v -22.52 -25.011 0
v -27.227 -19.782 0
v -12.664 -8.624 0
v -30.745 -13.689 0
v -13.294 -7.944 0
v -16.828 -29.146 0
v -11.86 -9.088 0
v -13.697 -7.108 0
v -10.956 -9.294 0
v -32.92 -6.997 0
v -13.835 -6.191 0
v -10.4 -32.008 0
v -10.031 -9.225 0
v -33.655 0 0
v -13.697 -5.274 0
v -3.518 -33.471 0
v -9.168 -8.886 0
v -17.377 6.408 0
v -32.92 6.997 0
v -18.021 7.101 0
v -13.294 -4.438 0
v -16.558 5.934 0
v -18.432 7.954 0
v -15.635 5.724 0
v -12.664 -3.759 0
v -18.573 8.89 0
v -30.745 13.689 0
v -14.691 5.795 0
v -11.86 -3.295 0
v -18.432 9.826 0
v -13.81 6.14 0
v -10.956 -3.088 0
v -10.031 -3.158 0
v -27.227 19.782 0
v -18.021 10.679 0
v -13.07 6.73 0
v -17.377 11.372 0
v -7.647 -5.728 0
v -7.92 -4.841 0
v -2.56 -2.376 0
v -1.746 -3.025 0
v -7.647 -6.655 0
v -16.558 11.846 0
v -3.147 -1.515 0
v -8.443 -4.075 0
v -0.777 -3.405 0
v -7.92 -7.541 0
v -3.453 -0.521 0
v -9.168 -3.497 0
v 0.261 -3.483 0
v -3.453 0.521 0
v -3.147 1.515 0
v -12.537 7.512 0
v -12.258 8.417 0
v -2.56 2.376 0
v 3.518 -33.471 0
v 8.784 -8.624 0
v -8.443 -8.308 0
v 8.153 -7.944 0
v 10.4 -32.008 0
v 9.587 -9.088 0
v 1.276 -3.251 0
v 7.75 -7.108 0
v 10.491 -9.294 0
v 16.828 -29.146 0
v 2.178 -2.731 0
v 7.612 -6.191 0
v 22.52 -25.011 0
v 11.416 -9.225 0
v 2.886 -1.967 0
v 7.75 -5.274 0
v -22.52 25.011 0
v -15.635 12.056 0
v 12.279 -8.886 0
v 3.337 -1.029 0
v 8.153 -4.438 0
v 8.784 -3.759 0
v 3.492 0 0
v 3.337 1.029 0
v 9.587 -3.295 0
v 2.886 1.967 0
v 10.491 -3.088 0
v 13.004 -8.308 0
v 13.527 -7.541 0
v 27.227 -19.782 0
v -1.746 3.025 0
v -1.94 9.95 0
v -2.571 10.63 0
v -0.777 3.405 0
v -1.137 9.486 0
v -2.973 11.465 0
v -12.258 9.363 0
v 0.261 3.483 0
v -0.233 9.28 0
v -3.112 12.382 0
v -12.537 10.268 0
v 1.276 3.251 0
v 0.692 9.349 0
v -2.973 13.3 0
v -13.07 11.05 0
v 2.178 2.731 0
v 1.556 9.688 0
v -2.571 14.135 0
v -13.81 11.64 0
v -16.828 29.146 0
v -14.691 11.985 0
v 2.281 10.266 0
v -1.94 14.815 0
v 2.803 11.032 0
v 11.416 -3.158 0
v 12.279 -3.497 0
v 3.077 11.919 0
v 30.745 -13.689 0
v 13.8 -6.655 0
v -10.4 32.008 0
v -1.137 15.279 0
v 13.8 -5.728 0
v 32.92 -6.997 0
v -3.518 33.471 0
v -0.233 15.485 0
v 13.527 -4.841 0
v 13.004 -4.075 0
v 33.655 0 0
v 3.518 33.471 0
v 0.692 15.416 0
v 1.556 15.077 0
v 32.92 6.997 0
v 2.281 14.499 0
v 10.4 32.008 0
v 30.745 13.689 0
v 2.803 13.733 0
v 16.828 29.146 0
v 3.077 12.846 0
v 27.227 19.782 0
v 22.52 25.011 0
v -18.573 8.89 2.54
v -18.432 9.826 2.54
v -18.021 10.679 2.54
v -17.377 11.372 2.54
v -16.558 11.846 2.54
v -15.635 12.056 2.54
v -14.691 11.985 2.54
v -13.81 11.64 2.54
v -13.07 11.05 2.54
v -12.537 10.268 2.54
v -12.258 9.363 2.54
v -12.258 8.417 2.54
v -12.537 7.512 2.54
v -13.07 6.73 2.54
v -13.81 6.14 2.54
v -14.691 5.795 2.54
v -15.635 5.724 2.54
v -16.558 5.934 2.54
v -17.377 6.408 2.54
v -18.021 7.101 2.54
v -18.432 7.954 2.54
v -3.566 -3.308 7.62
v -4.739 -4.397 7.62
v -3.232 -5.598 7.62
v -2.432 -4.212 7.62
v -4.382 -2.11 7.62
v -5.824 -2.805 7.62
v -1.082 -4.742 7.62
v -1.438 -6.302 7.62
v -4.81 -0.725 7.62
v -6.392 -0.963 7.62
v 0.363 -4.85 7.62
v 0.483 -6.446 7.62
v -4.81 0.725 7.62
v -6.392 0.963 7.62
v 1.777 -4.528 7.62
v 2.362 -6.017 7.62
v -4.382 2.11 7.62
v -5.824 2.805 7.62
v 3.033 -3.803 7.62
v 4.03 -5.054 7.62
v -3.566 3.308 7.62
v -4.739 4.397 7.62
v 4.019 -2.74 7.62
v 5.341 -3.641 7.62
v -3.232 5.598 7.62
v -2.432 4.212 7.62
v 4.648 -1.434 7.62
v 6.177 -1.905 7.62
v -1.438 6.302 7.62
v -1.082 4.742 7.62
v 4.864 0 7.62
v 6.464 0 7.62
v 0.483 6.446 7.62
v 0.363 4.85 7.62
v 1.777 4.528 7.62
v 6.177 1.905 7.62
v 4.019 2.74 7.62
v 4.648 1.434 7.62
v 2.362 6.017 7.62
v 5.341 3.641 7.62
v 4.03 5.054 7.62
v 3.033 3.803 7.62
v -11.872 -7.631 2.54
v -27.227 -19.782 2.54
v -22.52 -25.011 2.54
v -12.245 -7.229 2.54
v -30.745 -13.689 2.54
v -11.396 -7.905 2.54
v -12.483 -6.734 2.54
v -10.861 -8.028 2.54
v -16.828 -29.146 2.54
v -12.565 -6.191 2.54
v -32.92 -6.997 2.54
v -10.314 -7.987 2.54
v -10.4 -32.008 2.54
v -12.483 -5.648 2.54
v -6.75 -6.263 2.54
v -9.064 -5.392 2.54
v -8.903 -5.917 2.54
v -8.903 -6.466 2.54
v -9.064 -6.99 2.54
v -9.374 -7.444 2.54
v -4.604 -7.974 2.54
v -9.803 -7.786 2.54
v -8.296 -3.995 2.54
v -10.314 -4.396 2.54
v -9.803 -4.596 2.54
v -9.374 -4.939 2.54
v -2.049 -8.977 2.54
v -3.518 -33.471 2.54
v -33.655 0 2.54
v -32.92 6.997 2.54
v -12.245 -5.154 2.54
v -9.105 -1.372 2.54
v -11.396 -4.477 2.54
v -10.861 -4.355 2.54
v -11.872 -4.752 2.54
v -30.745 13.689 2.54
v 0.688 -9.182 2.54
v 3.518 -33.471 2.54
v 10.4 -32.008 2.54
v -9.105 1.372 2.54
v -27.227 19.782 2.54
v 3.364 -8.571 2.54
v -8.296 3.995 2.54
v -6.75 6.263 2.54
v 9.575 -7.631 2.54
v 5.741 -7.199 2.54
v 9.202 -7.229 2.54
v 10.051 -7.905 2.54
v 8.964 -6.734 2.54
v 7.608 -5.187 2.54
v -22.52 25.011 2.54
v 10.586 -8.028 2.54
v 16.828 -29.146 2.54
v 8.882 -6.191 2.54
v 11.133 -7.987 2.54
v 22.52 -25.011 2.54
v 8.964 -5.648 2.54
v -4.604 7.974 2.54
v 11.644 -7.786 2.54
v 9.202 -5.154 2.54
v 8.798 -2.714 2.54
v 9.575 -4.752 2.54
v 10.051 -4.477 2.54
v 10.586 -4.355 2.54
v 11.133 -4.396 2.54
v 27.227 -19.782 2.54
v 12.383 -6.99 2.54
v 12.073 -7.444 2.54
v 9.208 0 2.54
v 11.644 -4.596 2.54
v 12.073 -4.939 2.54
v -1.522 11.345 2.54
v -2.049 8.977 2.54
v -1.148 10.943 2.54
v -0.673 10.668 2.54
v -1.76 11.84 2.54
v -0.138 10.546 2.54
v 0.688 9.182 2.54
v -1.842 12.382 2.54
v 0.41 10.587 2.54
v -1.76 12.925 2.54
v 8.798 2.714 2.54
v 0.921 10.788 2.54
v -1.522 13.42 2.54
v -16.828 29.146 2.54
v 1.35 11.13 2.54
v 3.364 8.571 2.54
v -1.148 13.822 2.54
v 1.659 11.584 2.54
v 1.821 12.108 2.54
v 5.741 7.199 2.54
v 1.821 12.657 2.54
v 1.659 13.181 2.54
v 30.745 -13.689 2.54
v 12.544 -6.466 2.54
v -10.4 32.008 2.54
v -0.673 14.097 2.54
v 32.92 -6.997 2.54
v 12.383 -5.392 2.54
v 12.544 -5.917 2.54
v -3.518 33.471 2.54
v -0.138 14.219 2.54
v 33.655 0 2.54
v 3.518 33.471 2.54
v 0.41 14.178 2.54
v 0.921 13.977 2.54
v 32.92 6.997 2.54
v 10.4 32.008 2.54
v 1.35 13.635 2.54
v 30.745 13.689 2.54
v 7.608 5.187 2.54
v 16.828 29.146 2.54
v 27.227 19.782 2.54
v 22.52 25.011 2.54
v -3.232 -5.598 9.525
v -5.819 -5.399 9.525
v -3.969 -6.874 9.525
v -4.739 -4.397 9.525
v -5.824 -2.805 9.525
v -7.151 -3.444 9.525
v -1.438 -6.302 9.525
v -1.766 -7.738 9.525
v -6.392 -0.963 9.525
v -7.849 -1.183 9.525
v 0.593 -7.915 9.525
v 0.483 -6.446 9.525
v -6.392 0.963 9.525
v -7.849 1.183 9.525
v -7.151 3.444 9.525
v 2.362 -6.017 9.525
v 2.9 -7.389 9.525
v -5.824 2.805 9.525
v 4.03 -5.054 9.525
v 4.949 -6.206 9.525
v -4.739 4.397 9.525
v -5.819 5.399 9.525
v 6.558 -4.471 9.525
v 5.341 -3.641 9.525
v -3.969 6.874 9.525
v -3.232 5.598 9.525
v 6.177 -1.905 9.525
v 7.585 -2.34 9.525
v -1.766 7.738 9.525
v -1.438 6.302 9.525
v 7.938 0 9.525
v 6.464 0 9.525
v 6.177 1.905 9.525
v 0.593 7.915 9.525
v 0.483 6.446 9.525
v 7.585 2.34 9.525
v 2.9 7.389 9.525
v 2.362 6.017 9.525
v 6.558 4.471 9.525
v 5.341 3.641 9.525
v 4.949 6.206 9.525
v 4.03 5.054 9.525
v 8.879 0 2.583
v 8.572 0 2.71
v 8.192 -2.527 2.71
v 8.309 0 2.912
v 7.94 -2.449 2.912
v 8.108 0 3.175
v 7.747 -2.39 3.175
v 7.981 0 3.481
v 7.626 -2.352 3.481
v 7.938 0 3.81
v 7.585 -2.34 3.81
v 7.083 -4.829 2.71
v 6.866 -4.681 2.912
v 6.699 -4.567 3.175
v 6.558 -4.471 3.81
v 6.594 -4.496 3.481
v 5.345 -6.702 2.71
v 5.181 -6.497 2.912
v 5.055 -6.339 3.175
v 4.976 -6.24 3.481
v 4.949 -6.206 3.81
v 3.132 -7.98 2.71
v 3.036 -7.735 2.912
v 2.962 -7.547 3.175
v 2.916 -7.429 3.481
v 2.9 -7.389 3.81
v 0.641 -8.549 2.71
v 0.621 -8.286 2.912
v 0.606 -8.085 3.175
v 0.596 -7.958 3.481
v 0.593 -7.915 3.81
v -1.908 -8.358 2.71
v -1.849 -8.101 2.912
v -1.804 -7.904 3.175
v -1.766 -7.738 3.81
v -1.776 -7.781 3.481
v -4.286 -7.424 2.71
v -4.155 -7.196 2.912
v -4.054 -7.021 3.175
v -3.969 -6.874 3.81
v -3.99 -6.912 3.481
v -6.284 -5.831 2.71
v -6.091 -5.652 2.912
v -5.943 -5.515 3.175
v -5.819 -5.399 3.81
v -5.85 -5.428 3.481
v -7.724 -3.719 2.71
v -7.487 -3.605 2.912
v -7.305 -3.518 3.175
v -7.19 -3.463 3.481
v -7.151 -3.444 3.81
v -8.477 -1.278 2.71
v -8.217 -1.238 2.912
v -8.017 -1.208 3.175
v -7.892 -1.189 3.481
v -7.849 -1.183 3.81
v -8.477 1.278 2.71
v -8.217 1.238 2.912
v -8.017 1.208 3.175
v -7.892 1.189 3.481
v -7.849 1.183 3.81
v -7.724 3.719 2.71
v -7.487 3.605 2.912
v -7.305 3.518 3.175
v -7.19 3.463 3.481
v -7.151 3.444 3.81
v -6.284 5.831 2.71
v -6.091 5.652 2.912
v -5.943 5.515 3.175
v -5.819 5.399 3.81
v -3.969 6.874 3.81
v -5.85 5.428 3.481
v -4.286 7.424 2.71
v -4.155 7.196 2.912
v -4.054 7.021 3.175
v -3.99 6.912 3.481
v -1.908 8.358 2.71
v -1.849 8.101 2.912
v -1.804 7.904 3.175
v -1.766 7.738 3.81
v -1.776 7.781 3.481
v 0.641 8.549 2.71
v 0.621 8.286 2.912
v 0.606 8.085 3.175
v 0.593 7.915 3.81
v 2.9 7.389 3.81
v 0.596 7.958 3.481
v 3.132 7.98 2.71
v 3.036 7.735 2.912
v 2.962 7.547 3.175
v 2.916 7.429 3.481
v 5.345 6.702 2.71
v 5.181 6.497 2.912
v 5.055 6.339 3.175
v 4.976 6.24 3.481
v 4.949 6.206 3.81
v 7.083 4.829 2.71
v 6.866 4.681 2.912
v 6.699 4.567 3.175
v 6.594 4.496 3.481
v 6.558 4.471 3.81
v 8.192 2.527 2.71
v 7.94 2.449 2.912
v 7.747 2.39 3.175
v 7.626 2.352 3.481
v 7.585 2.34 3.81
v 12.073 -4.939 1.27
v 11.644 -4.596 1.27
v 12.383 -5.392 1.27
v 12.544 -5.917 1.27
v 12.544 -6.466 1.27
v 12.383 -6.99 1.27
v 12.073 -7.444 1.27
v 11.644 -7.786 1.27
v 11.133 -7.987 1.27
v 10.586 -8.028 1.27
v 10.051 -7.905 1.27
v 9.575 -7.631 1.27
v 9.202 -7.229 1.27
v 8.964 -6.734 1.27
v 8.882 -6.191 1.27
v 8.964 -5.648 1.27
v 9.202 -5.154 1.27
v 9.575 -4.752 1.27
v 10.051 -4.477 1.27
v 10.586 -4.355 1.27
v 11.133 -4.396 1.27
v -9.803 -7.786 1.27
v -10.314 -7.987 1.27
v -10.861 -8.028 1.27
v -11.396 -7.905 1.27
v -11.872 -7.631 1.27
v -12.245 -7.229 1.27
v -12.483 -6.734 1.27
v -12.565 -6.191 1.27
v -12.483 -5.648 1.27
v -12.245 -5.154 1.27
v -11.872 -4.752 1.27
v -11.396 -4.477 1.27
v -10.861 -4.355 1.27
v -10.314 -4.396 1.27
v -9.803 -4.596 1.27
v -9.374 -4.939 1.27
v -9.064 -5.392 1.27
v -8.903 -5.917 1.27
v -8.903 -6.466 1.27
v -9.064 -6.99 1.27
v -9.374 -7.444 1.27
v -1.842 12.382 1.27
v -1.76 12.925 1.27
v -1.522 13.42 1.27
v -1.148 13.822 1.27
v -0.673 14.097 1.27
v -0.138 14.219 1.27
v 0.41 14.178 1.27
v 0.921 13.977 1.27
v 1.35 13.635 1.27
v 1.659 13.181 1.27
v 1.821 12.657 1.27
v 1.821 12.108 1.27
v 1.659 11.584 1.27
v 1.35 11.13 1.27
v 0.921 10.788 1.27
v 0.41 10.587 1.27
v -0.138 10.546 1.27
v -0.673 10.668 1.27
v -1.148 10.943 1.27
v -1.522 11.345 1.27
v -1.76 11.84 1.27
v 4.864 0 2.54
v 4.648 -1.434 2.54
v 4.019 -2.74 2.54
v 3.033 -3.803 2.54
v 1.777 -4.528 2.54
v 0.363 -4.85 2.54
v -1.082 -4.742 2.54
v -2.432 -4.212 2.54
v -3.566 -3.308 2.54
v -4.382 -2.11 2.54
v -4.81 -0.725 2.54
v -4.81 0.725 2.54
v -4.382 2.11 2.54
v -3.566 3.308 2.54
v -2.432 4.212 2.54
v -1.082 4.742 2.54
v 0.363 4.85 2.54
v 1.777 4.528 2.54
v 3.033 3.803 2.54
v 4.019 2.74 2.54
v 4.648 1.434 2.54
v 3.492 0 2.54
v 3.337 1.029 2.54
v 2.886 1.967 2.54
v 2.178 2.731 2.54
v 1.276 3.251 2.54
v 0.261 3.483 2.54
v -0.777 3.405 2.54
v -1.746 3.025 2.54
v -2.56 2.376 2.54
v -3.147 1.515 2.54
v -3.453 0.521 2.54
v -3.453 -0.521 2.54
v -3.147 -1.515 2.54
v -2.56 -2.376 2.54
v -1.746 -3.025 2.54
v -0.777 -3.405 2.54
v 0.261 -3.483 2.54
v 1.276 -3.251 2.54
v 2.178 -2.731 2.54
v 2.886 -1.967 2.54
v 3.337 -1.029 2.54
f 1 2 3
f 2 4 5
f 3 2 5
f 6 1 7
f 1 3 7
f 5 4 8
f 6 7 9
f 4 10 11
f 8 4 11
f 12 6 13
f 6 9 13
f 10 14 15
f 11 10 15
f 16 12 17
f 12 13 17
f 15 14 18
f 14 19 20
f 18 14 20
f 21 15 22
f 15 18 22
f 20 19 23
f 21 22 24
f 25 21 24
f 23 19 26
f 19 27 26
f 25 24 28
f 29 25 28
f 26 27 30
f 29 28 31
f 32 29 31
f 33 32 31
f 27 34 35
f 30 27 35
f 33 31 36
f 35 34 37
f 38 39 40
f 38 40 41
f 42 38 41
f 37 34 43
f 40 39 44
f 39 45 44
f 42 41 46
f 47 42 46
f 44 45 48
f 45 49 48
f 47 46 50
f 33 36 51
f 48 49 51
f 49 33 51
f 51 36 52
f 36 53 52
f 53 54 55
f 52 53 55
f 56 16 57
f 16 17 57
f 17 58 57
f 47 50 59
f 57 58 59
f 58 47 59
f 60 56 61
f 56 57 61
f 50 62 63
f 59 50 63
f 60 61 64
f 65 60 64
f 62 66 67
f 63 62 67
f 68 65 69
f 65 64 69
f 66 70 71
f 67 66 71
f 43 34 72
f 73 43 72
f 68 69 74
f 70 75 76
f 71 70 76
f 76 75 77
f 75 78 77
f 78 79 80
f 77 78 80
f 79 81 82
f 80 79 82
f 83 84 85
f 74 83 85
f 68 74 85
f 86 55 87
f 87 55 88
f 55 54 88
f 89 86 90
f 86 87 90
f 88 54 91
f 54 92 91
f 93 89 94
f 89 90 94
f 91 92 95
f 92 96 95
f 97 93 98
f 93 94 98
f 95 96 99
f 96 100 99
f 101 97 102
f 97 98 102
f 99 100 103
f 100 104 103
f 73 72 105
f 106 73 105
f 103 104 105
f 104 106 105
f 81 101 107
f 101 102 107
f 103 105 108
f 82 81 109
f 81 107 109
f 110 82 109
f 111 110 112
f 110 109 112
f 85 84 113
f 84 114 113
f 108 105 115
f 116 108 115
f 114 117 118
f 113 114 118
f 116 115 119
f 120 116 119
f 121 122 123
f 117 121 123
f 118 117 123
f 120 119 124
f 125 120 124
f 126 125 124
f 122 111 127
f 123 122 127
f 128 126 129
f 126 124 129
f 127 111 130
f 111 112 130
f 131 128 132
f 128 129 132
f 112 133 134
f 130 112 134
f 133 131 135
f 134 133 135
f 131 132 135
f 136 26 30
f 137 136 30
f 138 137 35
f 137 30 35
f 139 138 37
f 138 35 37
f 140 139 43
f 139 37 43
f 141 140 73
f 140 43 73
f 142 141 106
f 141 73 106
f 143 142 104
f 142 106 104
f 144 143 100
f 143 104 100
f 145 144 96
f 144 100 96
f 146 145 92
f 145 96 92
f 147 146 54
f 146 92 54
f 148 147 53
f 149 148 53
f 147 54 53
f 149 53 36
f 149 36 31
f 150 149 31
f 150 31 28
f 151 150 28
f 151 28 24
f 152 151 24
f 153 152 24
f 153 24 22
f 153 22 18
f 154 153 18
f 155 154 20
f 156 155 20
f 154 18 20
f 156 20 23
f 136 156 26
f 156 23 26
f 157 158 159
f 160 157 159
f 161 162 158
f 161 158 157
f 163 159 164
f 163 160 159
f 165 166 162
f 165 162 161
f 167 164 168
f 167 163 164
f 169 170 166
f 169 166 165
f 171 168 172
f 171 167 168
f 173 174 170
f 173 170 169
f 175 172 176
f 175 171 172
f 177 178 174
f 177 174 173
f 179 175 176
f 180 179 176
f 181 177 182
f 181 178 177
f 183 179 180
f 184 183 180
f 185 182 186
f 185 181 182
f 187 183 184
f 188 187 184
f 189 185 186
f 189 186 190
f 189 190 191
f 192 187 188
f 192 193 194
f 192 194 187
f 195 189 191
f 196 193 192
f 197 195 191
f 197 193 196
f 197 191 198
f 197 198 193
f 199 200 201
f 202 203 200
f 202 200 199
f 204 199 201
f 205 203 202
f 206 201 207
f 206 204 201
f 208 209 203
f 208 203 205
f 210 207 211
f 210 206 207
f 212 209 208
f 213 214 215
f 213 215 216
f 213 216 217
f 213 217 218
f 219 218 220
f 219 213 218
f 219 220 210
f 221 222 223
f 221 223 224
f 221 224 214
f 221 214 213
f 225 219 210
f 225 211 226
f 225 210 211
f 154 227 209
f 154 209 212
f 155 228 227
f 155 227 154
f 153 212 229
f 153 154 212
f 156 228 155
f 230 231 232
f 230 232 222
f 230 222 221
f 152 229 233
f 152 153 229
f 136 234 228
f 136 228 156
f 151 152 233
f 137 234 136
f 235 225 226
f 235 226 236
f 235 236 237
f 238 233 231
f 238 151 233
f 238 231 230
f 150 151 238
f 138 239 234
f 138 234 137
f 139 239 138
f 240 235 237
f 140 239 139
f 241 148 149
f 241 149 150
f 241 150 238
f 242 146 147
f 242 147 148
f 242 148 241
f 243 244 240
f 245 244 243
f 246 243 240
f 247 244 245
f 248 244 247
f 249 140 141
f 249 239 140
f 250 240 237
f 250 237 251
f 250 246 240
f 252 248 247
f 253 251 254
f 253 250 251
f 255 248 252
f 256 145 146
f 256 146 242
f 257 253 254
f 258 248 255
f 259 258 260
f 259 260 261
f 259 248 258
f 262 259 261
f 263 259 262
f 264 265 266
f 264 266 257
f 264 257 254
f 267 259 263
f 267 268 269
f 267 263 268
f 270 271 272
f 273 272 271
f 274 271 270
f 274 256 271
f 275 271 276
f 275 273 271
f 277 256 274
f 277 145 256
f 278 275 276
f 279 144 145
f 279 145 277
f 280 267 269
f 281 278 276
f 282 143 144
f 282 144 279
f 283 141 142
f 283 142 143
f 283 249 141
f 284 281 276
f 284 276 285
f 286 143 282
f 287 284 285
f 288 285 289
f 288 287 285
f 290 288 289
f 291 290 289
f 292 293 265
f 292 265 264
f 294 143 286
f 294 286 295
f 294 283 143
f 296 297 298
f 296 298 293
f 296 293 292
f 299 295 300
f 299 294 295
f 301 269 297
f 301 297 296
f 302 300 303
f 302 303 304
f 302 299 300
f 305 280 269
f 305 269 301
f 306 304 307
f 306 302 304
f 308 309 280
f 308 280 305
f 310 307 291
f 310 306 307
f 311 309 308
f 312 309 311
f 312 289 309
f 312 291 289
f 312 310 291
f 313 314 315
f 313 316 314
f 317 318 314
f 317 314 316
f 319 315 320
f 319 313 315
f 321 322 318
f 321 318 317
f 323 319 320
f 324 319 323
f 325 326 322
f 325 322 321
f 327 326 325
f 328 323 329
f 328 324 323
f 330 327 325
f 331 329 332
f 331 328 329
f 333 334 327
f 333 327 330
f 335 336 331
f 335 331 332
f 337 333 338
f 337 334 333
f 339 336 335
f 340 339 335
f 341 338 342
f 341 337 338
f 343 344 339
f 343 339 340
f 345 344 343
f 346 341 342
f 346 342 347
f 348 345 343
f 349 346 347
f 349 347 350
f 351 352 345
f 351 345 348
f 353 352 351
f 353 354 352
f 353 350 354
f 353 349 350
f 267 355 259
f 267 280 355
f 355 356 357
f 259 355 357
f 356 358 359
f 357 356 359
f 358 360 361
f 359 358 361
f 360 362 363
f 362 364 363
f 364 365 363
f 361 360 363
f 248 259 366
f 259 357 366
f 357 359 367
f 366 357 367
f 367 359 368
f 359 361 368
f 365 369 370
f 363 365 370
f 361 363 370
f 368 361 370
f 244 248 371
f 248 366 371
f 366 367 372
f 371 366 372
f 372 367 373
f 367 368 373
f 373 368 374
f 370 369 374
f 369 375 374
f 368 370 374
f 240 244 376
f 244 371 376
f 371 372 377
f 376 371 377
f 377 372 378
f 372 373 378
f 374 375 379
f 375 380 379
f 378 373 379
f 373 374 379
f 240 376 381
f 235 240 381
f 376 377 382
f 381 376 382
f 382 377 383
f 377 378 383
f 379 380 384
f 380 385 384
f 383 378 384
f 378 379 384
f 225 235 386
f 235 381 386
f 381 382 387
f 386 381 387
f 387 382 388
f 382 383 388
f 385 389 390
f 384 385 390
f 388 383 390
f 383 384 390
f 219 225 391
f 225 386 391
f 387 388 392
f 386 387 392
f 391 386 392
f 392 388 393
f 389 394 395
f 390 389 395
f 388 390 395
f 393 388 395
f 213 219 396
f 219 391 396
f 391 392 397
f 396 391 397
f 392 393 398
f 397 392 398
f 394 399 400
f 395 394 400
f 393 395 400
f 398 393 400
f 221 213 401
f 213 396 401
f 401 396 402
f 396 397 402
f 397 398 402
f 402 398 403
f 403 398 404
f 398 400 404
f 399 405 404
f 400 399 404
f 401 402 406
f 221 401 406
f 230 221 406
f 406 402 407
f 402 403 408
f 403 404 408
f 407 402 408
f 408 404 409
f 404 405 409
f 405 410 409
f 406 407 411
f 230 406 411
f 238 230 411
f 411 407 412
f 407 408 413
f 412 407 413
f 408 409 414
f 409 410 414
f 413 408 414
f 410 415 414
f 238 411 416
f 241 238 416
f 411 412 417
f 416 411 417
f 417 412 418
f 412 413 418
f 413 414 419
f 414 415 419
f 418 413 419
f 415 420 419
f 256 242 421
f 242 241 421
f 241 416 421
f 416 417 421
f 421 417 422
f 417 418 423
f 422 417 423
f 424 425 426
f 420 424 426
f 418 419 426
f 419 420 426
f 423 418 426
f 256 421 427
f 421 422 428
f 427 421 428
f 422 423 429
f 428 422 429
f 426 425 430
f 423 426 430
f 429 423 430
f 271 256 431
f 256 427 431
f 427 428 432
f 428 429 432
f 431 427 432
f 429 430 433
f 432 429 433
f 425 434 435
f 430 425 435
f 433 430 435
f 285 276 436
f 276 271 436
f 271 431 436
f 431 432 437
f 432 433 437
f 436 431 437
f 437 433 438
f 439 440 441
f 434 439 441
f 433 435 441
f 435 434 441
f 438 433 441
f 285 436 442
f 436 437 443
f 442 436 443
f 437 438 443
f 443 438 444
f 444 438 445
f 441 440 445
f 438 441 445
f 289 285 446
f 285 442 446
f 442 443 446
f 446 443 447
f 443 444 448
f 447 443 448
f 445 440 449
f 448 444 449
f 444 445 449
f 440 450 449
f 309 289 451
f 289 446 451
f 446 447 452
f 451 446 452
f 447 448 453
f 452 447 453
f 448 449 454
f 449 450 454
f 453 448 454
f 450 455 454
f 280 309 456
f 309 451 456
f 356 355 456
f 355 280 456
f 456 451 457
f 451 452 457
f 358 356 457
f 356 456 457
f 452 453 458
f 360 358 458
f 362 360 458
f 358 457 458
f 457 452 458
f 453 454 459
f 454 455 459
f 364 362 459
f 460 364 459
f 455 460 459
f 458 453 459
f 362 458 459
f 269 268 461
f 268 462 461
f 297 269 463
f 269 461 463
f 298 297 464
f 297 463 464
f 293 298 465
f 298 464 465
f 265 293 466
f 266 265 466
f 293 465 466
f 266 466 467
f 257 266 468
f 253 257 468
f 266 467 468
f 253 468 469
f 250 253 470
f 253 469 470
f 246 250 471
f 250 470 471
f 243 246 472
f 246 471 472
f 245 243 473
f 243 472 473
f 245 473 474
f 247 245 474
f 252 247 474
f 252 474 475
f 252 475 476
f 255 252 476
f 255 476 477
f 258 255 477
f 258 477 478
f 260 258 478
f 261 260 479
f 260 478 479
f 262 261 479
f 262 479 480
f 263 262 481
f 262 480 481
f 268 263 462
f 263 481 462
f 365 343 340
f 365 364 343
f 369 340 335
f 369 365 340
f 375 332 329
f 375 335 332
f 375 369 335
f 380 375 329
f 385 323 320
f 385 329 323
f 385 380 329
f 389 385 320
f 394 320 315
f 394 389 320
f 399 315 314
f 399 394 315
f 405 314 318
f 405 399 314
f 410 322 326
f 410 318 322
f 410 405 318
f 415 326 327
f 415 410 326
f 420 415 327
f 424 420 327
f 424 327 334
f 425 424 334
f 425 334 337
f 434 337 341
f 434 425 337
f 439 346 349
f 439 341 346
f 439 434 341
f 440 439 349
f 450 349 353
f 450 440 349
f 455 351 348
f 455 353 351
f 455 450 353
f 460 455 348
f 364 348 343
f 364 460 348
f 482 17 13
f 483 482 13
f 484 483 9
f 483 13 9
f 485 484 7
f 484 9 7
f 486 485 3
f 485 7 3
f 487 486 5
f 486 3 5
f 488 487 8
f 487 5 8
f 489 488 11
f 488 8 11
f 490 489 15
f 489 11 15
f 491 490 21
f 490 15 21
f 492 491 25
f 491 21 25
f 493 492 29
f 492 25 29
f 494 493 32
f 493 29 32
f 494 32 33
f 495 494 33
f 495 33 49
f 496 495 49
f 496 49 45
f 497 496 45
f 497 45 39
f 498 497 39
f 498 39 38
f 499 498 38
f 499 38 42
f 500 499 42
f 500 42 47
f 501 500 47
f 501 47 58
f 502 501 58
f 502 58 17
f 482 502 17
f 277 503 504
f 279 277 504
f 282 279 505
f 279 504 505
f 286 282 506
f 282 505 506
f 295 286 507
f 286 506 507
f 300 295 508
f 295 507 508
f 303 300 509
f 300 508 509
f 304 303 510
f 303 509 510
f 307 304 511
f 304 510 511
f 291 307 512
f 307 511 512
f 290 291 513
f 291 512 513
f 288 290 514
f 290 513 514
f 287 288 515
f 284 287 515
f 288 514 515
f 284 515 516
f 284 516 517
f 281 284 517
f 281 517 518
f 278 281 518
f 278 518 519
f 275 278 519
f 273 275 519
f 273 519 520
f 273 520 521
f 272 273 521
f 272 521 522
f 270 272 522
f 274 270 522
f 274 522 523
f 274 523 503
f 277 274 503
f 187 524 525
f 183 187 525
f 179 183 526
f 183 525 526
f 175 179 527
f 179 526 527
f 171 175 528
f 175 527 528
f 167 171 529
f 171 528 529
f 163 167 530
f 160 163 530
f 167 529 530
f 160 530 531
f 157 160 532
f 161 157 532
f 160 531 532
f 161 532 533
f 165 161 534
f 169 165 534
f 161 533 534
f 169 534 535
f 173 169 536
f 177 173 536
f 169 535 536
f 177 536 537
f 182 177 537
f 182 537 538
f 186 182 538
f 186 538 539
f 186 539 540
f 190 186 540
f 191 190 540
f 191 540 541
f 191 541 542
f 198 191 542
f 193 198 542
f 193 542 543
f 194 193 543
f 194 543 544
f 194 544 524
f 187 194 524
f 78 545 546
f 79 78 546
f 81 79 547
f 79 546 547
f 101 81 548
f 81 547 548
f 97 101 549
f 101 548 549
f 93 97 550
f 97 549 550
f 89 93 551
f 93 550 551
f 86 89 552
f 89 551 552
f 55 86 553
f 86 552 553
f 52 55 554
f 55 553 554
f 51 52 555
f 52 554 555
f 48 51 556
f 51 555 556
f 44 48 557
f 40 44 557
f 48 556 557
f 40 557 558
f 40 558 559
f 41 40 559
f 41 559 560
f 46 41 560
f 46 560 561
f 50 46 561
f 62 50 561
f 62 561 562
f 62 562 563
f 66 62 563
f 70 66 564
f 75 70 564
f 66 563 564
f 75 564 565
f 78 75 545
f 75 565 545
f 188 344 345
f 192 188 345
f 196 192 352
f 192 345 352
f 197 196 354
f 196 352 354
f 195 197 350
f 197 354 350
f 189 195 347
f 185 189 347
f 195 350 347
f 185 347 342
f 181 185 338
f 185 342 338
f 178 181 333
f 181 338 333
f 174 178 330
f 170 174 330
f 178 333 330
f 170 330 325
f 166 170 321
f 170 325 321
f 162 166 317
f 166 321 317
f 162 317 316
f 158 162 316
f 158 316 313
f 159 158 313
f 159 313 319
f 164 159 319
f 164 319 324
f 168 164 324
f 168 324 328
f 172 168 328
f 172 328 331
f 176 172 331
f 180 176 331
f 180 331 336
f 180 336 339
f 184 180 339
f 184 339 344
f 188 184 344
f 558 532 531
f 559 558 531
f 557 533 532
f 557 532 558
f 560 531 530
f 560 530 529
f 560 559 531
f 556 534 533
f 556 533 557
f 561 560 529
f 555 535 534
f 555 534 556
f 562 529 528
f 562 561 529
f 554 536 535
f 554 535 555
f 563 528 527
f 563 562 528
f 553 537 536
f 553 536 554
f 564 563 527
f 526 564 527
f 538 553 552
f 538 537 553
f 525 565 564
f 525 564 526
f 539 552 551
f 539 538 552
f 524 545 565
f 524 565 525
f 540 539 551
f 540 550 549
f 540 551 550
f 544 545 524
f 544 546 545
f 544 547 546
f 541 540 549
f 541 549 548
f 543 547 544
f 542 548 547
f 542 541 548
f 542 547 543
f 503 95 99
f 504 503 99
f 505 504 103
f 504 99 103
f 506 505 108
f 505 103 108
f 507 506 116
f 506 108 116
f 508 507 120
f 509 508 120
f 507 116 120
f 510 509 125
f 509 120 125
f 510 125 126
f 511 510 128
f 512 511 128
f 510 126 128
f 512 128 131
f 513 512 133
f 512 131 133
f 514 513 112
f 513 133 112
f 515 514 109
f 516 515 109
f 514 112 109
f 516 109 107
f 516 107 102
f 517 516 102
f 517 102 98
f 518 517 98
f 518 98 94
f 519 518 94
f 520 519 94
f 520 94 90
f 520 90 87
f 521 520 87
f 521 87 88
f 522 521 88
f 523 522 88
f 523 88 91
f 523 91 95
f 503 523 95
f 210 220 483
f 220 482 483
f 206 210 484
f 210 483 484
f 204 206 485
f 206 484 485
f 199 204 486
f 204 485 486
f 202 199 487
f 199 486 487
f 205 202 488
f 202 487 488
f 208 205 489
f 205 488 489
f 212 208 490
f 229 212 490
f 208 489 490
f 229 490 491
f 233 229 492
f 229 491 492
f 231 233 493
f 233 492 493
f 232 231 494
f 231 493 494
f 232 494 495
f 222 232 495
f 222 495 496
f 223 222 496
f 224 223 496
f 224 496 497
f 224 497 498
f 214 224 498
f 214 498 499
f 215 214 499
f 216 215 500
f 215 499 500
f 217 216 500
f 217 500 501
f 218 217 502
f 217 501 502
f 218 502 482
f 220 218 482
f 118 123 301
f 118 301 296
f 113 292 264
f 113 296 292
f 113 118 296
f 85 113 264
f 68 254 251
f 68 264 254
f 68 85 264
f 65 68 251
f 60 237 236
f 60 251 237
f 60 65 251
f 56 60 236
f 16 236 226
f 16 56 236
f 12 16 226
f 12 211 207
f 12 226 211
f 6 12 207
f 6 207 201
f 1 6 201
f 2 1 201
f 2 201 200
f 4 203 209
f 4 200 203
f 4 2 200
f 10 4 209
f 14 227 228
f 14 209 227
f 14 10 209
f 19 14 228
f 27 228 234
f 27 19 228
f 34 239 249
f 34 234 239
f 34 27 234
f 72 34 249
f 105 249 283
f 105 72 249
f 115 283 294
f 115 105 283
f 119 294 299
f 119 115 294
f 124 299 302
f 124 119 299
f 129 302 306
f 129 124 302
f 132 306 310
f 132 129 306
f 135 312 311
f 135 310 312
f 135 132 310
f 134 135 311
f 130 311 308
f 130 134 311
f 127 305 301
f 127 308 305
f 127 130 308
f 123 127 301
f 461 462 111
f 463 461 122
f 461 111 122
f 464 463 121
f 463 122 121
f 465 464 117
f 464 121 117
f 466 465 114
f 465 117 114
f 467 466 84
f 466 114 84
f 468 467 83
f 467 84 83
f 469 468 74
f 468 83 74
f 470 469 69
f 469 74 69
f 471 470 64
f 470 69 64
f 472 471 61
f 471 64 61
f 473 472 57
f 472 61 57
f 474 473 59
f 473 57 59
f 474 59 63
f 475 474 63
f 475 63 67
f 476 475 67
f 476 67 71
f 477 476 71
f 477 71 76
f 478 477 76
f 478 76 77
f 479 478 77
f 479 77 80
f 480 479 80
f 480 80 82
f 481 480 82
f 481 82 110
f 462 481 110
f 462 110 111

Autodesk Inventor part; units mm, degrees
ref_plane "YZ Plane" through (0, 0, 0) normal (1, 0, 0) x (0, 1, 0)
ref_plane "XZ Plane" through (0, 0, 0) normal (0, 1, 0) x (-1, 0, 0)
ref_plane "XY Plane" through (0, 0, 0) normal (0, 0, 1) x (1, 0, 0)
sketch "Sketch1" plane through (0, 0, 0) normal (0, 0, 1) x (1, 0, 0)
  circle A0 centre (0, 0) radius 33.655
  dimension "d0" = 67.31
extrude "Extrusion1" add sketch "Sketch1" along normal blind 2.54
sketch "Sketch2" plane through (0, 0, 0) normal (0, 0, -1) x (-1, 0, 0)
  circle A0 centre (0, 12.3825) radius 1.8415
  point P0 (0, 0)
  dimension "d3" = 3.683
  dimension "d4" = 12.3825
extrude "Extrusion2" cut sketch "Sketch2" against normal through all
chamfer "Chamfer1" distance 1.27 angle 45 1 edges at (1.8415, 12.3825, 0)
pattern_circular "Circular Pattern1" count 3 over 360 about axis through (0, 0, 0) along (0, 0, 1) of "Extrusion2", "Chamfer1"
sketch "Sketch3" plane through (0, 0, 2.54) normal (0, 0, 1) x (1, 0, 0)
  circle A0 centre (0, 0) radius 7.9375
  circle A1 centre (0, 0) radius 3.4925
  circle A2 centre (0, 0) radius 4.8641
  dimension "d13" = 15.875
  dimension "d14" = 6.985
  dimension "d15" = 9.7282
extrude "Extrusion3" add sketch "Sketch3" along normal blind 6.985 contours A0
extrude "Extrusion4" cut sketch "Sketch3" against normal through all contours A1
fillet "Fillet1" radius 1.27 1 edges at (-7.9375, 0, 2.54)
sketch "Sketch4" plane through (0, 0, 0) normal (0, 0, -1) x (-1, 0, 0)
  line L0 (0, 0) -> (15.3979, 8.89) construction
  line L1 (0, 0) -> (17.78, 0) construction
  circle A0 centre (15.3979, 8.89) radius 3.175
  dimension "d21" = 17.78
  dimension "d22" = 30
  dimension "d23" = 6.35
extrude "Extrusion5" cut sketch "Sketch4" against normal through all
sketch "Sketch5" plane through (0, 0, 9.525) normal (0, 0, 1) x (1, 0, 0)
  circle A0 centre (0, 0) radius 6.4643
  dimension "d26" = 12.9286
extrude "Extrusion6" cut sketch "Sketch5" against normal blind 1.905
properties part number "SmallSpoolEndFore" material "ABS Plastic"
